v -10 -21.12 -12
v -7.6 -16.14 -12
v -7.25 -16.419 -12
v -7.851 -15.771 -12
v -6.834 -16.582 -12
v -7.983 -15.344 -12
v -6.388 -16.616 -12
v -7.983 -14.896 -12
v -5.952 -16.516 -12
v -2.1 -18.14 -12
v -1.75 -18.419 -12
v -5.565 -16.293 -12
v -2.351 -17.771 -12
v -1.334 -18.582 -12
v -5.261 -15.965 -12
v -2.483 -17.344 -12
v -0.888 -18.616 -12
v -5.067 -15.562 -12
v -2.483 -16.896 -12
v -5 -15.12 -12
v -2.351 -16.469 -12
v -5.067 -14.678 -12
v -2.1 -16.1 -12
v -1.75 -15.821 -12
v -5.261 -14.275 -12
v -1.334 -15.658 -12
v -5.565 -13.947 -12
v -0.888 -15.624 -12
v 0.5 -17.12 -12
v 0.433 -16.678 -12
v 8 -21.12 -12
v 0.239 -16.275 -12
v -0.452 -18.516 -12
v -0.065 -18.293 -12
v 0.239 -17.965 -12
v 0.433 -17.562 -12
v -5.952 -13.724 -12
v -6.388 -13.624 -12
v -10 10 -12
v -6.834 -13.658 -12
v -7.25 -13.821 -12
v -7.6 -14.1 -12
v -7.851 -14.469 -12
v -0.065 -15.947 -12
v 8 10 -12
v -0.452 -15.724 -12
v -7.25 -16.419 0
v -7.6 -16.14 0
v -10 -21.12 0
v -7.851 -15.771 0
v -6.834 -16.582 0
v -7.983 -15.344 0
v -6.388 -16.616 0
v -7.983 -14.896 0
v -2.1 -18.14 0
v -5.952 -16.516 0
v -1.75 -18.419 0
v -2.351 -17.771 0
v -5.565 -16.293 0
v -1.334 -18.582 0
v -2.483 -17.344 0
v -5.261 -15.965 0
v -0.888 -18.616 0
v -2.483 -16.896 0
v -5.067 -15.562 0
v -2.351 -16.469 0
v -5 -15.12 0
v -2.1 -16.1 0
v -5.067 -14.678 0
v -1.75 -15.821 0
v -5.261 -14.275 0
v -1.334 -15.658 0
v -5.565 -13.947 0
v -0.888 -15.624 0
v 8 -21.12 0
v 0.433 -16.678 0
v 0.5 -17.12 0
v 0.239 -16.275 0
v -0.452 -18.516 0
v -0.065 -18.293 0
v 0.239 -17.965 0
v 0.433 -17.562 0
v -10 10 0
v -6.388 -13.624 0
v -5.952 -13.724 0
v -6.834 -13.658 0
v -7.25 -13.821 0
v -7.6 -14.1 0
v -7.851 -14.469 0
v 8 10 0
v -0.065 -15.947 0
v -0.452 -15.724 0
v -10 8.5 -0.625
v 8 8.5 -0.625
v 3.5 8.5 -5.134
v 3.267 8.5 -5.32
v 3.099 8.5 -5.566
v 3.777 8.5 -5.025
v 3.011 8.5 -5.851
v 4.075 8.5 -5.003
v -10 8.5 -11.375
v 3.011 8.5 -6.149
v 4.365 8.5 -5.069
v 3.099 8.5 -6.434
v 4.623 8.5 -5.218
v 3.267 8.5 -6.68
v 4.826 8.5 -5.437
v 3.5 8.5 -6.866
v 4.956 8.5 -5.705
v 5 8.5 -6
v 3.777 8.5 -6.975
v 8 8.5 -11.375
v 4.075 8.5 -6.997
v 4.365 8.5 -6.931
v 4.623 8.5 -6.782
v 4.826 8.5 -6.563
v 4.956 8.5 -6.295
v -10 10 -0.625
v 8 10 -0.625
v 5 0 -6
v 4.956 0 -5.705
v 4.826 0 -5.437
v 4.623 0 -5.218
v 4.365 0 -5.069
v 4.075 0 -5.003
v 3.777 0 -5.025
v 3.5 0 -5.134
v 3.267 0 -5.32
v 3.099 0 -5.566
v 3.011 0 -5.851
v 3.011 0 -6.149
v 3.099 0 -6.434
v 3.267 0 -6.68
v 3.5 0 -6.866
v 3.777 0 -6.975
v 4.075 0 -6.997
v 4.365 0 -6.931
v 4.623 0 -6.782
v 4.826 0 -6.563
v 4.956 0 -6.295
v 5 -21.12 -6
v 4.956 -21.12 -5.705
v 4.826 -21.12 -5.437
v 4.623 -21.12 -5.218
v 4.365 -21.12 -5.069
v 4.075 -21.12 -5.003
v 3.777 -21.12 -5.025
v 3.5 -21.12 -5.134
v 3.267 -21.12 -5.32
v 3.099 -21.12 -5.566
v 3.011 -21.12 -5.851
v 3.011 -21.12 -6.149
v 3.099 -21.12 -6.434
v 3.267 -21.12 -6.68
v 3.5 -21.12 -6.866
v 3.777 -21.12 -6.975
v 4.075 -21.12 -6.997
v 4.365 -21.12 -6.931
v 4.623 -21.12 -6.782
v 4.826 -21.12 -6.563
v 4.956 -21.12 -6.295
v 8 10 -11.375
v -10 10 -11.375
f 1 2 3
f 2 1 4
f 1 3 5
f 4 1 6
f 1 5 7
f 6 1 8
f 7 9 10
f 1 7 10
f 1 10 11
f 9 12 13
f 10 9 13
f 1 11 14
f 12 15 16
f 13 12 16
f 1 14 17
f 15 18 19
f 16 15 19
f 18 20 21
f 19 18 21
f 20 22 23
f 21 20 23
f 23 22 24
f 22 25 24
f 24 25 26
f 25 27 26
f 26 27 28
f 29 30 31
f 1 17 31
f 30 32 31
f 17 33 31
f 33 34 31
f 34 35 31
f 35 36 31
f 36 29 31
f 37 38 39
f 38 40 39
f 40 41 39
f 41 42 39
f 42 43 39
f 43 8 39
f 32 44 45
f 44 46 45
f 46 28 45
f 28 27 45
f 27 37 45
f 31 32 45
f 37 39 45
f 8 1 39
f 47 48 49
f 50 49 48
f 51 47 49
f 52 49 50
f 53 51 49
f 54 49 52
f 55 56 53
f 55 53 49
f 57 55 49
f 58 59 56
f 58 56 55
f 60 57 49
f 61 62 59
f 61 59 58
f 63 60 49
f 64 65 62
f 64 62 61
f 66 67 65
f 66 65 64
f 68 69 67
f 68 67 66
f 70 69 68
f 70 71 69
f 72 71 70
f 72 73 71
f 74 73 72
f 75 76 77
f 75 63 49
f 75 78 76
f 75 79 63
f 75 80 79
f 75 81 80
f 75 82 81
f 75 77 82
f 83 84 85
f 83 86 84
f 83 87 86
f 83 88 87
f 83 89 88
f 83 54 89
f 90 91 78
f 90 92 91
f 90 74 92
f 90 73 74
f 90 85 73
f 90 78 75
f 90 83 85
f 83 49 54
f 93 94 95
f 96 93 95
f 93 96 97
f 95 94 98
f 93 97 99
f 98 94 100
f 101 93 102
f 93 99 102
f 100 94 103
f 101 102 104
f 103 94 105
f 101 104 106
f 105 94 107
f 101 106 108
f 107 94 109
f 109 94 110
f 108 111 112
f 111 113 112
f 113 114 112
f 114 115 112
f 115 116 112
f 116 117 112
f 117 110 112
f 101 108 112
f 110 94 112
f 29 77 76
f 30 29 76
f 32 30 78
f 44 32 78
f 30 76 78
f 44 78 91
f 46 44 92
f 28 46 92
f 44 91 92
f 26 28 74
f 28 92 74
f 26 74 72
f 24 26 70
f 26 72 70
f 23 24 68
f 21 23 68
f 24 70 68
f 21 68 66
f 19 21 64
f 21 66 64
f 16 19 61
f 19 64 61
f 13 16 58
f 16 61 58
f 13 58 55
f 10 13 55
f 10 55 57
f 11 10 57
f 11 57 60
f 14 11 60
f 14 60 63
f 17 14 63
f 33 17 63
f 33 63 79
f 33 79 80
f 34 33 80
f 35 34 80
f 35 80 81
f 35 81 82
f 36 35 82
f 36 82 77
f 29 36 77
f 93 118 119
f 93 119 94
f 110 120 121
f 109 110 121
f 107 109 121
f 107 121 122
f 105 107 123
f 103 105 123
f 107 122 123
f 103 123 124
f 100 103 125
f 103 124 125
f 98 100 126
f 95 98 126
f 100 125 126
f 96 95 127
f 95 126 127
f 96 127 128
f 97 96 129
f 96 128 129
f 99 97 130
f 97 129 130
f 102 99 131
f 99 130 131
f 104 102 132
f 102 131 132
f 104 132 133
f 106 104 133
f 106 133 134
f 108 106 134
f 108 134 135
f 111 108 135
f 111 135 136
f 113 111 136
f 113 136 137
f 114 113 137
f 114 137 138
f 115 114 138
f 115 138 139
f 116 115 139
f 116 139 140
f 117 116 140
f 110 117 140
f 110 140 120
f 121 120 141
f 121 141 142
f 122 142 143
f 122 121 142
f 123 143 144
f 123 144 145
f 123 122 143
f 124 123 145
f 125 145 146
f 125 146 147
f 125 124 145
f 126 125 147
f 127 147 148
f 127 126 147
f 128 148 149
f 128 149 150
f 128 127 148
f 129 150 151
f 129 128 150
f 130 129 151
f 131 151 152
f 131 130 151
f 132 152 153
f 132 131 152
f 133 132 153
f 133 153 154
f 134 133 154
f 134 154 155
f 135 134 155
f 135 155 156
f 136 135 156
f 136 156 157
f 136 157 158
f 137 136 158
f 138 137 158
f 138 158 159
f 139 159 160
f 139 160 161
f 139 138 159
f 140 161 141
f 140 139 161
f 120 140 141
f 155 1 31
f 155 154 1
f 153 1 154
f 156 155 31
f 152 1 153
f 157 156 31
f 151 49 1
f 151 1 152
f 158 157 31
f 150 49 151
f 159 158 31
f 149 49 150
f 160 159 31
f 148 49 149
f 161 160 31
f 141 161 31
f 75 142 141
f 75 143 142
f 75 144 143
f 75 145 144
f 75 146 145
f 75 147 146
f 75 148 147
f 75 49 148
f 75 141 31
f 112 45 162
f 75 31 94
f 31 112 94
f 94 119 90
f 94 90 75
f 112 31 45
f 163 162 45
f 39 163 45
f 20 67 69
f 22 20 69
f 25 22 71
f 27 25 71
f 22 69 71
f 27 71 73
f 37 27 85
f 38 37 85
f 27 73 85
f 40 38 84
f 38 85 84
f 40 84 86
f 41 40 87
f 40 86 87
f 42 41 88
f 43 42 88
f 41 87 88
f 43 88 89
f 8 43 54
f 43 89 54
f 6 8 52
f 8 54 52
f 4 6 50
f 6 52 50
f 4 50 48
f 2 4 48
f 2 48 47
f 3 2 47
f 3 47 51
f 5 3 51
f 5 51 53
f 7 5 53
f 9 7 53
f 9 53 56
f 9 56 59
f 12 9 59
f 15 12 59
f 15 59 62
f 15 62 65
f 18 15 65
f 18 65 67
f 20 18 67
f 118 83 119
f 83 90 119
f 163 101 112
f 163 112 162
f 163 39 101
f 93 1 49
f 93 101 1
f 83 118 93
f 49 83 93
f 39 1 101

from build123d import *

# Parameters (mm, degrees)
BOSS_EXTRUDE1_DEPTH = 8
CUT_EXTRUDE1_REACH  = 12
SKETCH3_R           = 1
BOSS_EXTRUDE2_DEPTH = 10
SKETCH7_W           = 18
SKETCH7_H           = 12
SKETCH7_R           = 1
BOSS_EXTRUDE3_DEPTH = 21.12
SKETCH11_R          = 1.5
CUT_EXTRUDE4_DEPTH  = 13


with BuildPart() as part:
    # Sketch2 → Boss-Extrude1 (new body)
    with BuildSketch(Plane(origin=(0, 0, 0), x_dir=(0, 0, -1), z_dir=(1, 0, 0))):
        Polygon((0, 0), (0, 10), (0.625, 10), (0.625, 8.5), (11.375, 8.5), (11.375, 10), (12, 10), (12, 0), align=None)
    extrude(amount=BOSS_EXTRUDE1_DEPTH)

    # Sketch3 → Cut-Extrude1 (cut, up to next)
    with BuildSketch(Plane.XZ, mode=Mode.PRIVATE) as cut_extrude1_sk1:
        with Locations((4, -6)):
            Circle(SKETCH3_R)
    cut_extrude1_tool1 = extrude(cut_extrude1_sk1.sketch, amount=-CUT_EXTRUDE1_REACH, mode=Mode.PRIVATE) & part.part
    add(cut_extrude1_tool1.solids().sort_by_distance((4, 0, -6))[0], mode=Mode.SUBTRACT)

    # Sketch6 → Boss-Extrude2 (add)
    with BuildSketch(Plane.ZY):
        Polygon((-12, 0), (0, 0), (0, 10), (-0.625, 10), (-0.625, 8.5), (-11.375, 8.5), (-11.375, 10), (-12, 10), align=None)
    extrude(amount=BOSS_EXTRUDE2_DEPTH)

    # Sketch7 → Boss-Extrude3 (add)
    with BuildSketch(Plane.XZ):
        with Locations((-1, -6)):
            Rectangle(SKETCH7_W, SKETCH7_H)
        with Locations((4, -6)):
            Circle(SKETCH7_R, mode=Mode.SUBTRACT)
    extrude(amount=BOSS_EXTRUDE3_DEPTH)

    # Sketch11 → Cut-Extrude4 (cut, through all)
    with BuildSketch(Plane.XY):
        with Locations((-6.5, -15.12)):
            Circle(SKETCH11_R)
        with Locations((-1, -17.12)):
            Circle(SKETCH11_R)
    extrude(amount=-CUT_EXTRUDE4_DEPTH, mode=Mode.SUBTRACT)


solid = part.part
